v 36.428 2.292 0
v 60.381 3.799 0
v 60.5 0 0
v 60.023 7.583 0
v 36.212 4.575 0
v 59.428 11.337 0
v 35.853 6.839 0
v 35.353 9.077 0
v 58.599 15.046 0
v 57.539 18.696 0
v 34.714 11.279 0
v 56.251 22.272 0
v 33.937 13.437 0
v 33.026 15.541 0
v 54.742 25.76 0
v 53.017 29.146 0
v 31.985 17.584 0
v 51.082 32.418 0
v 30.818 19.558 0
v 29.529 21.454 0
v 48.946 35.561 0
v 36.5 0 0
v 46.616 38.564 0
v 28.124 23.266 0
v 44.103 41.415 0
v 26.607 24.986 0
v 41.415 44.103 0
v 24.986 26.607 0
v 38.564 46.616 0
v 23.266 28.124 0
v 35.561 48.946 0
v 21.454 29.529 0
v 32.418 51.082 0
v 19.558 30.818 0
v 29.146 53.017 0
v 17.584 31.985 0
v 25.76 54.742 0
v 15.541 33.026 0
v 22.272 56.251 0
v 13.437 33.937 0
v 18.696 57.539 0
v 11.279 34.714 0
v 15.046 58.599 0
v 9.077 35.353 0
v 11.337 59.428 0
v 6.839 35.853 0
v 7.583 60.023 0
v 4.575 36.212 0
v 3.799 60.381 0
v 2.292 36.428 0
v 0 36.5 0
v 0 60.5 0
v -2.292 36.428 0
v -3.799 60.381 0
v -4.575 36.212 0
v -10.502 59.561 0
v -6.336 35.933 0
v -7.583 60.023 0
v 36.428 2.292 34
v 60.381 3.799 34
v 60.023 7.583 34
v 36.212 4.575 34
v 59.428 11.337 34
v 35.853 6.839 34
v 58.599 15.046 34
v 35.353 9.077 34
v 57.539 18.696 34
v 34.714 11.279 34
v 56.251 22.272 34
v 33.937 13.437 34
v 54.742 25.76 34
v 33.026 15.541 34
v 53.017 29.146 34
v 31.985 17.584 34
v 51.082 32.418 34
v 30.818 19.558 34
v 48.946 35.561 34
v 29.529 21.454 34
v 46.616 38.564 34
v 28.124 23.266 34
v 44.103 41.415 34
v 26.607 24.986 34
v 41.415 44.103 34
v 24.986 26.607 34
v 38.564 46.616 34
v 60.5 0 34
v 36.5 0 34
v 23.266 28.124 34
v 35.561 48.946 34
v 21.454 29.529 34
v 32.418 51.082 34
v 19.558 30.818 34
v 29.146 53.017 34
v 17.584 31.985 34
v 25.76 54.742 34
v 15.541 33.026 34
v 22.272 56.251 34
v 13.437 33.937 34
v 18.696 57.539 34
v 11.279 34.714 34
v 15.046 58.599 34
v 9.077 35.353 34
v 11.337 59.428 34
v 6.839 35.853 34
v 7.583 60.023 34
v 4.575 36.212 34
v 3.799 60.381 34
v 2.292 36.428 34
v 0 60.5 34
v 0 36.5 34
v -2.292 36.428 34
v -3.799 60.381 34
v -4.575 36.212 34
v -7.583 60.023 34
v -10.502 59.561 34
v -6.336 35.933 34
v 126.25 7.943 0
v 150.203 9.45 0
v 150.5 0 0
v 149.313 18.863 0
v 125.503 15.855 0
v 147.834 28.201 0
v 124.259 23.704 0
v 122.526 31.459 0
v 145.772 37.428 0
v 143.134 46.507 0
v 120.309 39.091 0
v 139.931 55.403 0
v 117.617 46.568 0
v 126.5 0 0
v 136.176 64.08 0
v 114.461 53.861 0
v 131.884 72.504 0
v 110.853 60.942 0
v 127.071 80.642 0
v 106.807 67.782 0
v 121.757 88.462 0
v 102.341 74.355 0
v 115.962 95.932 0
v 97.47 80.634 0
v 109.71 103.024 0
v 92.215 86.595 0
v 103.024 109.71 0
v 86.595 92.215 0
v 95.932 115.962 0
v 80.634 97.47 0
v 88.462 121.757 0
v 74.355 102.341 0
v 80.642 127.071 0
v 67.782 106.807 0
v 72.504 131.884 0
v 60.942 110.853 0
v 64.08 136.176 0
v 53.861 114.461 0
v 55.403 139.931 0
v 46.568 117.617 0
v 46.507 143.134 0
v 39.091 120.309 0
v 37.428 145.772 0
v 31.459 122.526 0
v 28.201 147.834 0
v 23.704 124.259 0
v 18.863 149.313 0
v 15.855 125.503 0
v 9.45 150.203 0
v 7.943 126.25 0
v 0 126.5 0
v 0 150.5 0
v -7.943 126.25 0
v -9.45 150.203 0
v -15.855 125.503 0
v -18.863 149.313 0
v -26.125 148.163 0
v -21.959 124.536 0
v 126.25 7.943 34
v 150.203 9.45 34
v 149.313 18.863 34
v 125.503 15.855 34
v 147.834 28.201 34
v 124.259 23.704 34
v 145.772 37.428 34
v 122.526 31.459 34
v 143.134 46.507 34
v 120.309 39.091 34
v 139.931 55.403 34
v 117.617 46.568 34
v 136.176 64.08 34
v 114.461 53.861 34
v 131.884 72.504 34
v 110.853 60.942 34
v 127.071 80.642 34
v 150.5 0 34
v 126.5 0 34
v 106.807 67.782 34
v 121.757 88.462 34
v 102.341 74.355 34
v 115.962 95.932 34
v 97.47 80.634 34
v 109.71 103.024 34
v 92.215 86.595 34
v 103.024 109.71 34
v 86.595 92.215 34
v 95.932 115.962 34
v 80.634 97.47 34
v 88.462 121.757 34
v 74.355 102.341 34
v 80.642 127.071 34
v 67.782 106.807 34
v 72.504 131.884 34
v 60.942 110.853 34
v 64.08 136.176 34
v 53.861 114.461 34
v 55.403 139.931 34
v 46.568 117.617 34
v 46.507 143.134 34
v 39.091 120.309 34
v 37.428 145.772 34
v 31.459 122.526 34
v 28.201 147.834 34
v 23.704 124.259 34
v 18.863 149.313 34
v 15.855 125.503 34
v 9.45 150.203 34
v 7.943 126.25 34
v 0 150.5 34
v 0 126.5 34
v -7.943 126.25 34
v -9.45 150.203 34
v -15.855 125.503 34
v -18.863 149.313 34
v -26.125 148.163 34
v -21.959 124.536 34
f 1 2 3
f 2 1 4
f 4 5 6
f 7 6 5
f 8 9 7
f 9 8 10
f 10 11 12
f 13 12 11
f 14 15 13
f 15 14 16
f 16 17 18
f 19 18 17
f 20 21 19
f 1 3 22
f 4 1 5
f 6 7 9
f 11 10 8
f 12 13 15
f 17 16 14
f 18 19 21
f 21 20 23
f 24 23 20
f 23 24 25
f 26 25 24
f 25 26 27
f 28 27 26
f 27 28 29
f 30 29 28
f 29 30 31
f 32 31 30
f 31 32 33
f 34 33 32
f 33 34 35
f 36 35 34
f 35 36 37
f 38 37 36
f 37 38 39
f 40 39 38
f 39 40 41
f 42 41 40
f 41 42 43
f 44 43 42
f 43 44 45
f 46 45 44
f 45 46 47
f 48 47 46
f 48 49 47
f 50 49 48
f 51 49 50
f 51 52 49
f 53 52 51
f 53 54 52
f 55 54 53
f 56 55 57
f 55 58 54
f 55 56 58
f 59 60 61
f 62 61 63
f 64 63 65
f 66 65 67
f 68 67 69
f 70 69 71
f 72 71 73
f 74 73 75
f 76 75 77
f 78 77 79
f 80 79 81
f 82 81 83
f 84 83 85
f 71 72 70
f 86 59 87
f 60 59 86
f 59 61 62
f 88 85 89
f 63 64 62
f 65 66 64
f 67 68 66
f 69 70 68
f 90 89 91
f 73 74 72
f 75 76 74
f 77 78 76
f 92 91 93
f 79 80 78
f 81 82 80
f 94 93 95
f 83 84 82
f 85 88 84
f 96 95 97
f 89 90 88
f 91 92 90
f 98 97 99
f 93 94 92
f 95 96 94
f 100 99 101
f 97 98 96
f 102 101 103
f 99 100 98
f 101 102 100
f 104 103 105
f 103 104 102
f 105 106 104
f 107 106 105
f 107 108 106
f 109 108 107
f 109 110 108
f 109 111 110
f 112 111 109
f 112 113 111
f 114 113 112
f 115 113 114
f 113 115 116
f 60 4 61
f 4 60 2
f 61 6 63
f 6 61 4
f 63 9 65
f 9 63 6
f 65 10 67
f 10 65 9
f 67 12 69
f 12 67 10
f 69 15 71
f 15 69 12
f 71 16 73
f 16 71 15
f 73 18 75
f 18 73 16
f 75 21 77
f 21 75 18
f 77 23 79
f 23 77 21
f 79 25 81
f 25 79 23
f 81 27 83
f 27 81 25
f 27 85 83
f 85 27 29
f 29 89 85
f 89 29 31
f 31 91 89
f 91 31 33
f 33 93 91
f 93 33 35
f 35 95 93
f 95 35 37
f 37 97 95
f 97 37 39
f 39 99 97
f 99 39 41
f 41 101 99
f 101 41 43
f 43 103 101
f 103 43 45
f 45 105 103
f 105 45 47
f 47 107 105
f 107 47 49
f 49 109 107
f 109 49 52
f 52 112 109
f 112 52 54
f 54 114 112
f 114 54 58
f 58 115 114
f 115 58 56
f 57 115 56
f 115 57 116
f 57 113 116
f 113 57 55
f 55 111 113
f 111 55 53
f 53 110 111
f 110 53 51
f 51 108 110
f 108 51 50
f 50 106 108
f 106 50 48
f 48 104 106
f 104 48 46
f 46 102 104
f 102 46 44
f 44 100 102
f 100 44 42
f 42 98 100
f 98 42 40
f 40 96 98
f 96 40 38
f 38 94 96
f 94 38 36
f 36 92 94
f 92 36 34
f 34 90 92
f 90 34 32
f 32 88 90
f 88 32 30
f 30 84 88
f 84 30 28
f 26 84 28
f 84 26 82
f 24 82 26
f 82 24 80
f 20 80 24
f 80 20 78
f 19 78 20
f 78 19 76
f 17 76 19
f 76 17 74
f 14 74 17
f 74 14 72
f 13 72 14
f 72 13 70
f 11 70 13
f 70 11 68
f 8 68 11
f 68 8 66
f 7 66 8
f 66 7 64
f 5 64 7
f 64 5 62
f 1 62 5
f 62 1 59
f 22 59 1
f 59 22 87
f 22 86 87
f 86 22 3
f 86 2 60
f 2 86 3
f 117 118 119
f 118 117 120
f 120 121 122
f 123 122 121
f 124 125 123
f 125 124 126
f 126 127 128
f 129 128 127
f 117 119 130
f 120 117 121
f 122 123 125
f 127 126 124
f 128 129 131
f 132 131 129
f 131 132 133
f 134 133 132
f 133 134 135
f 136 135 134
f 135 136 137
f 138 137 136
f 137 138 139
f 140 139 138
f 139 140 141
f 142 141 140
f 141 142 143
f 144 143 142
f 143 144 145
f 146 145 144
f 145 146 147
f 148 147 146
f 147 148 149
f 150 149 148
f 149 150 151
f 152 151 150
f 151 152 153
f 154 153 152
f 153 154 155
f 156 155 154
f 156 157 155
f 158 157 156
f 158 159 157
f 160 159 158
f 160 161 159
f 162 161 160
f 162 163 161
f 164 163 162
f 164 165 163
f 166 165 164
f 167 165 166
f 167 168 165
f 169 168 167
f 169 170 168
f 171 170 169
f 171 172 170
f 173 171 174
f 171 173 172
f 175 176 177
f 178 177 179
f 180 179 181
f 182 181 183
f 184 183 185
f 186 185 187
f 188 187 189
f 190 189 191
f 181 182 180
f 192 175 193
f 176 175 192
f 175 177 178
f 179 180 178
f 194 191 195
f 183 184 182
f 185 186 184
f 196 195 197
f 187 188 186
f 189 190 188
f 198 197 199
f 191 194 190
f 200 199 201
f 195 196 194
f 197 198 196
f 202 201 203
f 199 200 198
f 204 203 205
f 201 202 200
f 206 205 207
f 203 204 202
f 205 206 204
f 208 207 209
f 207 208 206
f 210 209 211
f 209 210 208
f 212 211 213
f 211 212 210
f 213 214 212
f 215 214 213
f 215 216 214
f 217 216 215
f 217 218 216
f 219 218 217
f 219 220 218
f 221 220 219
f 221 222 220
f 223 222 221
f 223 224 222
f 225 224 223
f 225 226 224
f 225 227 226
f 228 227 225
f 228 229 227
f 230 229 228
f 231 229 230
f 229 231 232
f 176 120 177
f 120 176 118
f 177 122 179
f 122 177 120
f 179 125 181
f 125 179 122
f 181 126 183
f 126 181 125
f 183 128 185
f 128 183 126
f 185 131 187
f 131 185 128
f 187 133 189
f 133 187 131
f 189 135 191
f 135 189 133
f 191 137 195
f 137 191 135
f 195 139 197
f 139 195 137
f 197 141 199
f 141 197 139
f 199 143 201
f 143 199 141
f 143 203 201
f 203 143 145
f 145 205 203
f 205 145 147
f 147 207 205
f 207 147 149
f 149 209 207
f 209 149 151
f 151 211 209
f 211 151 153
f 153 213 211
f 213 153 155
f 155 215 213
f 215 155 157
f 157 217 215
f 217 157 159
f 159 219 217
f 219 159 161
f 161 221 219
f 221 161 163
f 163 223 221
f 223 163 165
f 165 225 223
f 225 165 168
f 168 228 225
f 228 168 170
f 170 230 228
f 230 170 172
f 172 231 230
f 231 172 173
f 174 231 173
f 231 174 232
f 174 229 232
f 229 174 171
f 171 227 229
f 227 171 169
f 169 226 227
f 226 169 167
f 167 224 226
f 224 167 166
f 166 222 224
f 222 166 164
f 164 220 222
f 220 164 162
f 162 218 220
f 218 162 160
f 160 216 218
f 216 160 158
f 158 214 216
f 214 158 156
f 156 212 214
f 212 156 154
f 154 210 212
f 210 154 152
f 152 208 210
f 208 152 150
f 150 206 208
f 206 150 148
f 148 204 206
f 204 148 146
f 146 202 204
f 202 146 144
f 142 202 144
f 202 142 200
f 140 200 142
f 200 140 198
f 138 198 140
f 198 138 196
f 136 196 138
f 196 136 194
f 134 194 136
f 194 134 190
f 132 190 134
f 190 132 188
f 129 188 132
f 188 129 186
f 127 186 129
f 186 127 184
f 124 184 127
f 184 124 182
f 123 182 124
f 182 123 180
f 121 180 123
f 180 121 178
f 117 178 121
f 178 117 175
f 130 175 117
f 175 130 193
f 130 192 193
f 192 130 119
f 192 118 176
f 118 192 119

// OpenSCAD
$fn=100;
inside_d1 = 6*12+1;
inside_d2 = inside_d1 + 2*7.5*12;
cabinet_depth = 2*12;
cabinet_height = 34;

module cabinet(inside_d) {
    outside_d = inside_d + 2*cabinet_depth;
    linear_extrude(cabinet_height) difference() {
        circle(d=outside_d);
        circle(d=inside_d);
        mirror([0,1,0]) translate([-outside_d, 0, 0]) square([outside_d*2, outside_d * 2]);
        rotate(-80) mirror([0,1,0]) translate([-outside_d, 0, 0]) square([outside_d*2, outside_d * 2]);
    }
}

color("pink") cabinet(inside_d1);
color("pink") cabinet(inside_d2);
